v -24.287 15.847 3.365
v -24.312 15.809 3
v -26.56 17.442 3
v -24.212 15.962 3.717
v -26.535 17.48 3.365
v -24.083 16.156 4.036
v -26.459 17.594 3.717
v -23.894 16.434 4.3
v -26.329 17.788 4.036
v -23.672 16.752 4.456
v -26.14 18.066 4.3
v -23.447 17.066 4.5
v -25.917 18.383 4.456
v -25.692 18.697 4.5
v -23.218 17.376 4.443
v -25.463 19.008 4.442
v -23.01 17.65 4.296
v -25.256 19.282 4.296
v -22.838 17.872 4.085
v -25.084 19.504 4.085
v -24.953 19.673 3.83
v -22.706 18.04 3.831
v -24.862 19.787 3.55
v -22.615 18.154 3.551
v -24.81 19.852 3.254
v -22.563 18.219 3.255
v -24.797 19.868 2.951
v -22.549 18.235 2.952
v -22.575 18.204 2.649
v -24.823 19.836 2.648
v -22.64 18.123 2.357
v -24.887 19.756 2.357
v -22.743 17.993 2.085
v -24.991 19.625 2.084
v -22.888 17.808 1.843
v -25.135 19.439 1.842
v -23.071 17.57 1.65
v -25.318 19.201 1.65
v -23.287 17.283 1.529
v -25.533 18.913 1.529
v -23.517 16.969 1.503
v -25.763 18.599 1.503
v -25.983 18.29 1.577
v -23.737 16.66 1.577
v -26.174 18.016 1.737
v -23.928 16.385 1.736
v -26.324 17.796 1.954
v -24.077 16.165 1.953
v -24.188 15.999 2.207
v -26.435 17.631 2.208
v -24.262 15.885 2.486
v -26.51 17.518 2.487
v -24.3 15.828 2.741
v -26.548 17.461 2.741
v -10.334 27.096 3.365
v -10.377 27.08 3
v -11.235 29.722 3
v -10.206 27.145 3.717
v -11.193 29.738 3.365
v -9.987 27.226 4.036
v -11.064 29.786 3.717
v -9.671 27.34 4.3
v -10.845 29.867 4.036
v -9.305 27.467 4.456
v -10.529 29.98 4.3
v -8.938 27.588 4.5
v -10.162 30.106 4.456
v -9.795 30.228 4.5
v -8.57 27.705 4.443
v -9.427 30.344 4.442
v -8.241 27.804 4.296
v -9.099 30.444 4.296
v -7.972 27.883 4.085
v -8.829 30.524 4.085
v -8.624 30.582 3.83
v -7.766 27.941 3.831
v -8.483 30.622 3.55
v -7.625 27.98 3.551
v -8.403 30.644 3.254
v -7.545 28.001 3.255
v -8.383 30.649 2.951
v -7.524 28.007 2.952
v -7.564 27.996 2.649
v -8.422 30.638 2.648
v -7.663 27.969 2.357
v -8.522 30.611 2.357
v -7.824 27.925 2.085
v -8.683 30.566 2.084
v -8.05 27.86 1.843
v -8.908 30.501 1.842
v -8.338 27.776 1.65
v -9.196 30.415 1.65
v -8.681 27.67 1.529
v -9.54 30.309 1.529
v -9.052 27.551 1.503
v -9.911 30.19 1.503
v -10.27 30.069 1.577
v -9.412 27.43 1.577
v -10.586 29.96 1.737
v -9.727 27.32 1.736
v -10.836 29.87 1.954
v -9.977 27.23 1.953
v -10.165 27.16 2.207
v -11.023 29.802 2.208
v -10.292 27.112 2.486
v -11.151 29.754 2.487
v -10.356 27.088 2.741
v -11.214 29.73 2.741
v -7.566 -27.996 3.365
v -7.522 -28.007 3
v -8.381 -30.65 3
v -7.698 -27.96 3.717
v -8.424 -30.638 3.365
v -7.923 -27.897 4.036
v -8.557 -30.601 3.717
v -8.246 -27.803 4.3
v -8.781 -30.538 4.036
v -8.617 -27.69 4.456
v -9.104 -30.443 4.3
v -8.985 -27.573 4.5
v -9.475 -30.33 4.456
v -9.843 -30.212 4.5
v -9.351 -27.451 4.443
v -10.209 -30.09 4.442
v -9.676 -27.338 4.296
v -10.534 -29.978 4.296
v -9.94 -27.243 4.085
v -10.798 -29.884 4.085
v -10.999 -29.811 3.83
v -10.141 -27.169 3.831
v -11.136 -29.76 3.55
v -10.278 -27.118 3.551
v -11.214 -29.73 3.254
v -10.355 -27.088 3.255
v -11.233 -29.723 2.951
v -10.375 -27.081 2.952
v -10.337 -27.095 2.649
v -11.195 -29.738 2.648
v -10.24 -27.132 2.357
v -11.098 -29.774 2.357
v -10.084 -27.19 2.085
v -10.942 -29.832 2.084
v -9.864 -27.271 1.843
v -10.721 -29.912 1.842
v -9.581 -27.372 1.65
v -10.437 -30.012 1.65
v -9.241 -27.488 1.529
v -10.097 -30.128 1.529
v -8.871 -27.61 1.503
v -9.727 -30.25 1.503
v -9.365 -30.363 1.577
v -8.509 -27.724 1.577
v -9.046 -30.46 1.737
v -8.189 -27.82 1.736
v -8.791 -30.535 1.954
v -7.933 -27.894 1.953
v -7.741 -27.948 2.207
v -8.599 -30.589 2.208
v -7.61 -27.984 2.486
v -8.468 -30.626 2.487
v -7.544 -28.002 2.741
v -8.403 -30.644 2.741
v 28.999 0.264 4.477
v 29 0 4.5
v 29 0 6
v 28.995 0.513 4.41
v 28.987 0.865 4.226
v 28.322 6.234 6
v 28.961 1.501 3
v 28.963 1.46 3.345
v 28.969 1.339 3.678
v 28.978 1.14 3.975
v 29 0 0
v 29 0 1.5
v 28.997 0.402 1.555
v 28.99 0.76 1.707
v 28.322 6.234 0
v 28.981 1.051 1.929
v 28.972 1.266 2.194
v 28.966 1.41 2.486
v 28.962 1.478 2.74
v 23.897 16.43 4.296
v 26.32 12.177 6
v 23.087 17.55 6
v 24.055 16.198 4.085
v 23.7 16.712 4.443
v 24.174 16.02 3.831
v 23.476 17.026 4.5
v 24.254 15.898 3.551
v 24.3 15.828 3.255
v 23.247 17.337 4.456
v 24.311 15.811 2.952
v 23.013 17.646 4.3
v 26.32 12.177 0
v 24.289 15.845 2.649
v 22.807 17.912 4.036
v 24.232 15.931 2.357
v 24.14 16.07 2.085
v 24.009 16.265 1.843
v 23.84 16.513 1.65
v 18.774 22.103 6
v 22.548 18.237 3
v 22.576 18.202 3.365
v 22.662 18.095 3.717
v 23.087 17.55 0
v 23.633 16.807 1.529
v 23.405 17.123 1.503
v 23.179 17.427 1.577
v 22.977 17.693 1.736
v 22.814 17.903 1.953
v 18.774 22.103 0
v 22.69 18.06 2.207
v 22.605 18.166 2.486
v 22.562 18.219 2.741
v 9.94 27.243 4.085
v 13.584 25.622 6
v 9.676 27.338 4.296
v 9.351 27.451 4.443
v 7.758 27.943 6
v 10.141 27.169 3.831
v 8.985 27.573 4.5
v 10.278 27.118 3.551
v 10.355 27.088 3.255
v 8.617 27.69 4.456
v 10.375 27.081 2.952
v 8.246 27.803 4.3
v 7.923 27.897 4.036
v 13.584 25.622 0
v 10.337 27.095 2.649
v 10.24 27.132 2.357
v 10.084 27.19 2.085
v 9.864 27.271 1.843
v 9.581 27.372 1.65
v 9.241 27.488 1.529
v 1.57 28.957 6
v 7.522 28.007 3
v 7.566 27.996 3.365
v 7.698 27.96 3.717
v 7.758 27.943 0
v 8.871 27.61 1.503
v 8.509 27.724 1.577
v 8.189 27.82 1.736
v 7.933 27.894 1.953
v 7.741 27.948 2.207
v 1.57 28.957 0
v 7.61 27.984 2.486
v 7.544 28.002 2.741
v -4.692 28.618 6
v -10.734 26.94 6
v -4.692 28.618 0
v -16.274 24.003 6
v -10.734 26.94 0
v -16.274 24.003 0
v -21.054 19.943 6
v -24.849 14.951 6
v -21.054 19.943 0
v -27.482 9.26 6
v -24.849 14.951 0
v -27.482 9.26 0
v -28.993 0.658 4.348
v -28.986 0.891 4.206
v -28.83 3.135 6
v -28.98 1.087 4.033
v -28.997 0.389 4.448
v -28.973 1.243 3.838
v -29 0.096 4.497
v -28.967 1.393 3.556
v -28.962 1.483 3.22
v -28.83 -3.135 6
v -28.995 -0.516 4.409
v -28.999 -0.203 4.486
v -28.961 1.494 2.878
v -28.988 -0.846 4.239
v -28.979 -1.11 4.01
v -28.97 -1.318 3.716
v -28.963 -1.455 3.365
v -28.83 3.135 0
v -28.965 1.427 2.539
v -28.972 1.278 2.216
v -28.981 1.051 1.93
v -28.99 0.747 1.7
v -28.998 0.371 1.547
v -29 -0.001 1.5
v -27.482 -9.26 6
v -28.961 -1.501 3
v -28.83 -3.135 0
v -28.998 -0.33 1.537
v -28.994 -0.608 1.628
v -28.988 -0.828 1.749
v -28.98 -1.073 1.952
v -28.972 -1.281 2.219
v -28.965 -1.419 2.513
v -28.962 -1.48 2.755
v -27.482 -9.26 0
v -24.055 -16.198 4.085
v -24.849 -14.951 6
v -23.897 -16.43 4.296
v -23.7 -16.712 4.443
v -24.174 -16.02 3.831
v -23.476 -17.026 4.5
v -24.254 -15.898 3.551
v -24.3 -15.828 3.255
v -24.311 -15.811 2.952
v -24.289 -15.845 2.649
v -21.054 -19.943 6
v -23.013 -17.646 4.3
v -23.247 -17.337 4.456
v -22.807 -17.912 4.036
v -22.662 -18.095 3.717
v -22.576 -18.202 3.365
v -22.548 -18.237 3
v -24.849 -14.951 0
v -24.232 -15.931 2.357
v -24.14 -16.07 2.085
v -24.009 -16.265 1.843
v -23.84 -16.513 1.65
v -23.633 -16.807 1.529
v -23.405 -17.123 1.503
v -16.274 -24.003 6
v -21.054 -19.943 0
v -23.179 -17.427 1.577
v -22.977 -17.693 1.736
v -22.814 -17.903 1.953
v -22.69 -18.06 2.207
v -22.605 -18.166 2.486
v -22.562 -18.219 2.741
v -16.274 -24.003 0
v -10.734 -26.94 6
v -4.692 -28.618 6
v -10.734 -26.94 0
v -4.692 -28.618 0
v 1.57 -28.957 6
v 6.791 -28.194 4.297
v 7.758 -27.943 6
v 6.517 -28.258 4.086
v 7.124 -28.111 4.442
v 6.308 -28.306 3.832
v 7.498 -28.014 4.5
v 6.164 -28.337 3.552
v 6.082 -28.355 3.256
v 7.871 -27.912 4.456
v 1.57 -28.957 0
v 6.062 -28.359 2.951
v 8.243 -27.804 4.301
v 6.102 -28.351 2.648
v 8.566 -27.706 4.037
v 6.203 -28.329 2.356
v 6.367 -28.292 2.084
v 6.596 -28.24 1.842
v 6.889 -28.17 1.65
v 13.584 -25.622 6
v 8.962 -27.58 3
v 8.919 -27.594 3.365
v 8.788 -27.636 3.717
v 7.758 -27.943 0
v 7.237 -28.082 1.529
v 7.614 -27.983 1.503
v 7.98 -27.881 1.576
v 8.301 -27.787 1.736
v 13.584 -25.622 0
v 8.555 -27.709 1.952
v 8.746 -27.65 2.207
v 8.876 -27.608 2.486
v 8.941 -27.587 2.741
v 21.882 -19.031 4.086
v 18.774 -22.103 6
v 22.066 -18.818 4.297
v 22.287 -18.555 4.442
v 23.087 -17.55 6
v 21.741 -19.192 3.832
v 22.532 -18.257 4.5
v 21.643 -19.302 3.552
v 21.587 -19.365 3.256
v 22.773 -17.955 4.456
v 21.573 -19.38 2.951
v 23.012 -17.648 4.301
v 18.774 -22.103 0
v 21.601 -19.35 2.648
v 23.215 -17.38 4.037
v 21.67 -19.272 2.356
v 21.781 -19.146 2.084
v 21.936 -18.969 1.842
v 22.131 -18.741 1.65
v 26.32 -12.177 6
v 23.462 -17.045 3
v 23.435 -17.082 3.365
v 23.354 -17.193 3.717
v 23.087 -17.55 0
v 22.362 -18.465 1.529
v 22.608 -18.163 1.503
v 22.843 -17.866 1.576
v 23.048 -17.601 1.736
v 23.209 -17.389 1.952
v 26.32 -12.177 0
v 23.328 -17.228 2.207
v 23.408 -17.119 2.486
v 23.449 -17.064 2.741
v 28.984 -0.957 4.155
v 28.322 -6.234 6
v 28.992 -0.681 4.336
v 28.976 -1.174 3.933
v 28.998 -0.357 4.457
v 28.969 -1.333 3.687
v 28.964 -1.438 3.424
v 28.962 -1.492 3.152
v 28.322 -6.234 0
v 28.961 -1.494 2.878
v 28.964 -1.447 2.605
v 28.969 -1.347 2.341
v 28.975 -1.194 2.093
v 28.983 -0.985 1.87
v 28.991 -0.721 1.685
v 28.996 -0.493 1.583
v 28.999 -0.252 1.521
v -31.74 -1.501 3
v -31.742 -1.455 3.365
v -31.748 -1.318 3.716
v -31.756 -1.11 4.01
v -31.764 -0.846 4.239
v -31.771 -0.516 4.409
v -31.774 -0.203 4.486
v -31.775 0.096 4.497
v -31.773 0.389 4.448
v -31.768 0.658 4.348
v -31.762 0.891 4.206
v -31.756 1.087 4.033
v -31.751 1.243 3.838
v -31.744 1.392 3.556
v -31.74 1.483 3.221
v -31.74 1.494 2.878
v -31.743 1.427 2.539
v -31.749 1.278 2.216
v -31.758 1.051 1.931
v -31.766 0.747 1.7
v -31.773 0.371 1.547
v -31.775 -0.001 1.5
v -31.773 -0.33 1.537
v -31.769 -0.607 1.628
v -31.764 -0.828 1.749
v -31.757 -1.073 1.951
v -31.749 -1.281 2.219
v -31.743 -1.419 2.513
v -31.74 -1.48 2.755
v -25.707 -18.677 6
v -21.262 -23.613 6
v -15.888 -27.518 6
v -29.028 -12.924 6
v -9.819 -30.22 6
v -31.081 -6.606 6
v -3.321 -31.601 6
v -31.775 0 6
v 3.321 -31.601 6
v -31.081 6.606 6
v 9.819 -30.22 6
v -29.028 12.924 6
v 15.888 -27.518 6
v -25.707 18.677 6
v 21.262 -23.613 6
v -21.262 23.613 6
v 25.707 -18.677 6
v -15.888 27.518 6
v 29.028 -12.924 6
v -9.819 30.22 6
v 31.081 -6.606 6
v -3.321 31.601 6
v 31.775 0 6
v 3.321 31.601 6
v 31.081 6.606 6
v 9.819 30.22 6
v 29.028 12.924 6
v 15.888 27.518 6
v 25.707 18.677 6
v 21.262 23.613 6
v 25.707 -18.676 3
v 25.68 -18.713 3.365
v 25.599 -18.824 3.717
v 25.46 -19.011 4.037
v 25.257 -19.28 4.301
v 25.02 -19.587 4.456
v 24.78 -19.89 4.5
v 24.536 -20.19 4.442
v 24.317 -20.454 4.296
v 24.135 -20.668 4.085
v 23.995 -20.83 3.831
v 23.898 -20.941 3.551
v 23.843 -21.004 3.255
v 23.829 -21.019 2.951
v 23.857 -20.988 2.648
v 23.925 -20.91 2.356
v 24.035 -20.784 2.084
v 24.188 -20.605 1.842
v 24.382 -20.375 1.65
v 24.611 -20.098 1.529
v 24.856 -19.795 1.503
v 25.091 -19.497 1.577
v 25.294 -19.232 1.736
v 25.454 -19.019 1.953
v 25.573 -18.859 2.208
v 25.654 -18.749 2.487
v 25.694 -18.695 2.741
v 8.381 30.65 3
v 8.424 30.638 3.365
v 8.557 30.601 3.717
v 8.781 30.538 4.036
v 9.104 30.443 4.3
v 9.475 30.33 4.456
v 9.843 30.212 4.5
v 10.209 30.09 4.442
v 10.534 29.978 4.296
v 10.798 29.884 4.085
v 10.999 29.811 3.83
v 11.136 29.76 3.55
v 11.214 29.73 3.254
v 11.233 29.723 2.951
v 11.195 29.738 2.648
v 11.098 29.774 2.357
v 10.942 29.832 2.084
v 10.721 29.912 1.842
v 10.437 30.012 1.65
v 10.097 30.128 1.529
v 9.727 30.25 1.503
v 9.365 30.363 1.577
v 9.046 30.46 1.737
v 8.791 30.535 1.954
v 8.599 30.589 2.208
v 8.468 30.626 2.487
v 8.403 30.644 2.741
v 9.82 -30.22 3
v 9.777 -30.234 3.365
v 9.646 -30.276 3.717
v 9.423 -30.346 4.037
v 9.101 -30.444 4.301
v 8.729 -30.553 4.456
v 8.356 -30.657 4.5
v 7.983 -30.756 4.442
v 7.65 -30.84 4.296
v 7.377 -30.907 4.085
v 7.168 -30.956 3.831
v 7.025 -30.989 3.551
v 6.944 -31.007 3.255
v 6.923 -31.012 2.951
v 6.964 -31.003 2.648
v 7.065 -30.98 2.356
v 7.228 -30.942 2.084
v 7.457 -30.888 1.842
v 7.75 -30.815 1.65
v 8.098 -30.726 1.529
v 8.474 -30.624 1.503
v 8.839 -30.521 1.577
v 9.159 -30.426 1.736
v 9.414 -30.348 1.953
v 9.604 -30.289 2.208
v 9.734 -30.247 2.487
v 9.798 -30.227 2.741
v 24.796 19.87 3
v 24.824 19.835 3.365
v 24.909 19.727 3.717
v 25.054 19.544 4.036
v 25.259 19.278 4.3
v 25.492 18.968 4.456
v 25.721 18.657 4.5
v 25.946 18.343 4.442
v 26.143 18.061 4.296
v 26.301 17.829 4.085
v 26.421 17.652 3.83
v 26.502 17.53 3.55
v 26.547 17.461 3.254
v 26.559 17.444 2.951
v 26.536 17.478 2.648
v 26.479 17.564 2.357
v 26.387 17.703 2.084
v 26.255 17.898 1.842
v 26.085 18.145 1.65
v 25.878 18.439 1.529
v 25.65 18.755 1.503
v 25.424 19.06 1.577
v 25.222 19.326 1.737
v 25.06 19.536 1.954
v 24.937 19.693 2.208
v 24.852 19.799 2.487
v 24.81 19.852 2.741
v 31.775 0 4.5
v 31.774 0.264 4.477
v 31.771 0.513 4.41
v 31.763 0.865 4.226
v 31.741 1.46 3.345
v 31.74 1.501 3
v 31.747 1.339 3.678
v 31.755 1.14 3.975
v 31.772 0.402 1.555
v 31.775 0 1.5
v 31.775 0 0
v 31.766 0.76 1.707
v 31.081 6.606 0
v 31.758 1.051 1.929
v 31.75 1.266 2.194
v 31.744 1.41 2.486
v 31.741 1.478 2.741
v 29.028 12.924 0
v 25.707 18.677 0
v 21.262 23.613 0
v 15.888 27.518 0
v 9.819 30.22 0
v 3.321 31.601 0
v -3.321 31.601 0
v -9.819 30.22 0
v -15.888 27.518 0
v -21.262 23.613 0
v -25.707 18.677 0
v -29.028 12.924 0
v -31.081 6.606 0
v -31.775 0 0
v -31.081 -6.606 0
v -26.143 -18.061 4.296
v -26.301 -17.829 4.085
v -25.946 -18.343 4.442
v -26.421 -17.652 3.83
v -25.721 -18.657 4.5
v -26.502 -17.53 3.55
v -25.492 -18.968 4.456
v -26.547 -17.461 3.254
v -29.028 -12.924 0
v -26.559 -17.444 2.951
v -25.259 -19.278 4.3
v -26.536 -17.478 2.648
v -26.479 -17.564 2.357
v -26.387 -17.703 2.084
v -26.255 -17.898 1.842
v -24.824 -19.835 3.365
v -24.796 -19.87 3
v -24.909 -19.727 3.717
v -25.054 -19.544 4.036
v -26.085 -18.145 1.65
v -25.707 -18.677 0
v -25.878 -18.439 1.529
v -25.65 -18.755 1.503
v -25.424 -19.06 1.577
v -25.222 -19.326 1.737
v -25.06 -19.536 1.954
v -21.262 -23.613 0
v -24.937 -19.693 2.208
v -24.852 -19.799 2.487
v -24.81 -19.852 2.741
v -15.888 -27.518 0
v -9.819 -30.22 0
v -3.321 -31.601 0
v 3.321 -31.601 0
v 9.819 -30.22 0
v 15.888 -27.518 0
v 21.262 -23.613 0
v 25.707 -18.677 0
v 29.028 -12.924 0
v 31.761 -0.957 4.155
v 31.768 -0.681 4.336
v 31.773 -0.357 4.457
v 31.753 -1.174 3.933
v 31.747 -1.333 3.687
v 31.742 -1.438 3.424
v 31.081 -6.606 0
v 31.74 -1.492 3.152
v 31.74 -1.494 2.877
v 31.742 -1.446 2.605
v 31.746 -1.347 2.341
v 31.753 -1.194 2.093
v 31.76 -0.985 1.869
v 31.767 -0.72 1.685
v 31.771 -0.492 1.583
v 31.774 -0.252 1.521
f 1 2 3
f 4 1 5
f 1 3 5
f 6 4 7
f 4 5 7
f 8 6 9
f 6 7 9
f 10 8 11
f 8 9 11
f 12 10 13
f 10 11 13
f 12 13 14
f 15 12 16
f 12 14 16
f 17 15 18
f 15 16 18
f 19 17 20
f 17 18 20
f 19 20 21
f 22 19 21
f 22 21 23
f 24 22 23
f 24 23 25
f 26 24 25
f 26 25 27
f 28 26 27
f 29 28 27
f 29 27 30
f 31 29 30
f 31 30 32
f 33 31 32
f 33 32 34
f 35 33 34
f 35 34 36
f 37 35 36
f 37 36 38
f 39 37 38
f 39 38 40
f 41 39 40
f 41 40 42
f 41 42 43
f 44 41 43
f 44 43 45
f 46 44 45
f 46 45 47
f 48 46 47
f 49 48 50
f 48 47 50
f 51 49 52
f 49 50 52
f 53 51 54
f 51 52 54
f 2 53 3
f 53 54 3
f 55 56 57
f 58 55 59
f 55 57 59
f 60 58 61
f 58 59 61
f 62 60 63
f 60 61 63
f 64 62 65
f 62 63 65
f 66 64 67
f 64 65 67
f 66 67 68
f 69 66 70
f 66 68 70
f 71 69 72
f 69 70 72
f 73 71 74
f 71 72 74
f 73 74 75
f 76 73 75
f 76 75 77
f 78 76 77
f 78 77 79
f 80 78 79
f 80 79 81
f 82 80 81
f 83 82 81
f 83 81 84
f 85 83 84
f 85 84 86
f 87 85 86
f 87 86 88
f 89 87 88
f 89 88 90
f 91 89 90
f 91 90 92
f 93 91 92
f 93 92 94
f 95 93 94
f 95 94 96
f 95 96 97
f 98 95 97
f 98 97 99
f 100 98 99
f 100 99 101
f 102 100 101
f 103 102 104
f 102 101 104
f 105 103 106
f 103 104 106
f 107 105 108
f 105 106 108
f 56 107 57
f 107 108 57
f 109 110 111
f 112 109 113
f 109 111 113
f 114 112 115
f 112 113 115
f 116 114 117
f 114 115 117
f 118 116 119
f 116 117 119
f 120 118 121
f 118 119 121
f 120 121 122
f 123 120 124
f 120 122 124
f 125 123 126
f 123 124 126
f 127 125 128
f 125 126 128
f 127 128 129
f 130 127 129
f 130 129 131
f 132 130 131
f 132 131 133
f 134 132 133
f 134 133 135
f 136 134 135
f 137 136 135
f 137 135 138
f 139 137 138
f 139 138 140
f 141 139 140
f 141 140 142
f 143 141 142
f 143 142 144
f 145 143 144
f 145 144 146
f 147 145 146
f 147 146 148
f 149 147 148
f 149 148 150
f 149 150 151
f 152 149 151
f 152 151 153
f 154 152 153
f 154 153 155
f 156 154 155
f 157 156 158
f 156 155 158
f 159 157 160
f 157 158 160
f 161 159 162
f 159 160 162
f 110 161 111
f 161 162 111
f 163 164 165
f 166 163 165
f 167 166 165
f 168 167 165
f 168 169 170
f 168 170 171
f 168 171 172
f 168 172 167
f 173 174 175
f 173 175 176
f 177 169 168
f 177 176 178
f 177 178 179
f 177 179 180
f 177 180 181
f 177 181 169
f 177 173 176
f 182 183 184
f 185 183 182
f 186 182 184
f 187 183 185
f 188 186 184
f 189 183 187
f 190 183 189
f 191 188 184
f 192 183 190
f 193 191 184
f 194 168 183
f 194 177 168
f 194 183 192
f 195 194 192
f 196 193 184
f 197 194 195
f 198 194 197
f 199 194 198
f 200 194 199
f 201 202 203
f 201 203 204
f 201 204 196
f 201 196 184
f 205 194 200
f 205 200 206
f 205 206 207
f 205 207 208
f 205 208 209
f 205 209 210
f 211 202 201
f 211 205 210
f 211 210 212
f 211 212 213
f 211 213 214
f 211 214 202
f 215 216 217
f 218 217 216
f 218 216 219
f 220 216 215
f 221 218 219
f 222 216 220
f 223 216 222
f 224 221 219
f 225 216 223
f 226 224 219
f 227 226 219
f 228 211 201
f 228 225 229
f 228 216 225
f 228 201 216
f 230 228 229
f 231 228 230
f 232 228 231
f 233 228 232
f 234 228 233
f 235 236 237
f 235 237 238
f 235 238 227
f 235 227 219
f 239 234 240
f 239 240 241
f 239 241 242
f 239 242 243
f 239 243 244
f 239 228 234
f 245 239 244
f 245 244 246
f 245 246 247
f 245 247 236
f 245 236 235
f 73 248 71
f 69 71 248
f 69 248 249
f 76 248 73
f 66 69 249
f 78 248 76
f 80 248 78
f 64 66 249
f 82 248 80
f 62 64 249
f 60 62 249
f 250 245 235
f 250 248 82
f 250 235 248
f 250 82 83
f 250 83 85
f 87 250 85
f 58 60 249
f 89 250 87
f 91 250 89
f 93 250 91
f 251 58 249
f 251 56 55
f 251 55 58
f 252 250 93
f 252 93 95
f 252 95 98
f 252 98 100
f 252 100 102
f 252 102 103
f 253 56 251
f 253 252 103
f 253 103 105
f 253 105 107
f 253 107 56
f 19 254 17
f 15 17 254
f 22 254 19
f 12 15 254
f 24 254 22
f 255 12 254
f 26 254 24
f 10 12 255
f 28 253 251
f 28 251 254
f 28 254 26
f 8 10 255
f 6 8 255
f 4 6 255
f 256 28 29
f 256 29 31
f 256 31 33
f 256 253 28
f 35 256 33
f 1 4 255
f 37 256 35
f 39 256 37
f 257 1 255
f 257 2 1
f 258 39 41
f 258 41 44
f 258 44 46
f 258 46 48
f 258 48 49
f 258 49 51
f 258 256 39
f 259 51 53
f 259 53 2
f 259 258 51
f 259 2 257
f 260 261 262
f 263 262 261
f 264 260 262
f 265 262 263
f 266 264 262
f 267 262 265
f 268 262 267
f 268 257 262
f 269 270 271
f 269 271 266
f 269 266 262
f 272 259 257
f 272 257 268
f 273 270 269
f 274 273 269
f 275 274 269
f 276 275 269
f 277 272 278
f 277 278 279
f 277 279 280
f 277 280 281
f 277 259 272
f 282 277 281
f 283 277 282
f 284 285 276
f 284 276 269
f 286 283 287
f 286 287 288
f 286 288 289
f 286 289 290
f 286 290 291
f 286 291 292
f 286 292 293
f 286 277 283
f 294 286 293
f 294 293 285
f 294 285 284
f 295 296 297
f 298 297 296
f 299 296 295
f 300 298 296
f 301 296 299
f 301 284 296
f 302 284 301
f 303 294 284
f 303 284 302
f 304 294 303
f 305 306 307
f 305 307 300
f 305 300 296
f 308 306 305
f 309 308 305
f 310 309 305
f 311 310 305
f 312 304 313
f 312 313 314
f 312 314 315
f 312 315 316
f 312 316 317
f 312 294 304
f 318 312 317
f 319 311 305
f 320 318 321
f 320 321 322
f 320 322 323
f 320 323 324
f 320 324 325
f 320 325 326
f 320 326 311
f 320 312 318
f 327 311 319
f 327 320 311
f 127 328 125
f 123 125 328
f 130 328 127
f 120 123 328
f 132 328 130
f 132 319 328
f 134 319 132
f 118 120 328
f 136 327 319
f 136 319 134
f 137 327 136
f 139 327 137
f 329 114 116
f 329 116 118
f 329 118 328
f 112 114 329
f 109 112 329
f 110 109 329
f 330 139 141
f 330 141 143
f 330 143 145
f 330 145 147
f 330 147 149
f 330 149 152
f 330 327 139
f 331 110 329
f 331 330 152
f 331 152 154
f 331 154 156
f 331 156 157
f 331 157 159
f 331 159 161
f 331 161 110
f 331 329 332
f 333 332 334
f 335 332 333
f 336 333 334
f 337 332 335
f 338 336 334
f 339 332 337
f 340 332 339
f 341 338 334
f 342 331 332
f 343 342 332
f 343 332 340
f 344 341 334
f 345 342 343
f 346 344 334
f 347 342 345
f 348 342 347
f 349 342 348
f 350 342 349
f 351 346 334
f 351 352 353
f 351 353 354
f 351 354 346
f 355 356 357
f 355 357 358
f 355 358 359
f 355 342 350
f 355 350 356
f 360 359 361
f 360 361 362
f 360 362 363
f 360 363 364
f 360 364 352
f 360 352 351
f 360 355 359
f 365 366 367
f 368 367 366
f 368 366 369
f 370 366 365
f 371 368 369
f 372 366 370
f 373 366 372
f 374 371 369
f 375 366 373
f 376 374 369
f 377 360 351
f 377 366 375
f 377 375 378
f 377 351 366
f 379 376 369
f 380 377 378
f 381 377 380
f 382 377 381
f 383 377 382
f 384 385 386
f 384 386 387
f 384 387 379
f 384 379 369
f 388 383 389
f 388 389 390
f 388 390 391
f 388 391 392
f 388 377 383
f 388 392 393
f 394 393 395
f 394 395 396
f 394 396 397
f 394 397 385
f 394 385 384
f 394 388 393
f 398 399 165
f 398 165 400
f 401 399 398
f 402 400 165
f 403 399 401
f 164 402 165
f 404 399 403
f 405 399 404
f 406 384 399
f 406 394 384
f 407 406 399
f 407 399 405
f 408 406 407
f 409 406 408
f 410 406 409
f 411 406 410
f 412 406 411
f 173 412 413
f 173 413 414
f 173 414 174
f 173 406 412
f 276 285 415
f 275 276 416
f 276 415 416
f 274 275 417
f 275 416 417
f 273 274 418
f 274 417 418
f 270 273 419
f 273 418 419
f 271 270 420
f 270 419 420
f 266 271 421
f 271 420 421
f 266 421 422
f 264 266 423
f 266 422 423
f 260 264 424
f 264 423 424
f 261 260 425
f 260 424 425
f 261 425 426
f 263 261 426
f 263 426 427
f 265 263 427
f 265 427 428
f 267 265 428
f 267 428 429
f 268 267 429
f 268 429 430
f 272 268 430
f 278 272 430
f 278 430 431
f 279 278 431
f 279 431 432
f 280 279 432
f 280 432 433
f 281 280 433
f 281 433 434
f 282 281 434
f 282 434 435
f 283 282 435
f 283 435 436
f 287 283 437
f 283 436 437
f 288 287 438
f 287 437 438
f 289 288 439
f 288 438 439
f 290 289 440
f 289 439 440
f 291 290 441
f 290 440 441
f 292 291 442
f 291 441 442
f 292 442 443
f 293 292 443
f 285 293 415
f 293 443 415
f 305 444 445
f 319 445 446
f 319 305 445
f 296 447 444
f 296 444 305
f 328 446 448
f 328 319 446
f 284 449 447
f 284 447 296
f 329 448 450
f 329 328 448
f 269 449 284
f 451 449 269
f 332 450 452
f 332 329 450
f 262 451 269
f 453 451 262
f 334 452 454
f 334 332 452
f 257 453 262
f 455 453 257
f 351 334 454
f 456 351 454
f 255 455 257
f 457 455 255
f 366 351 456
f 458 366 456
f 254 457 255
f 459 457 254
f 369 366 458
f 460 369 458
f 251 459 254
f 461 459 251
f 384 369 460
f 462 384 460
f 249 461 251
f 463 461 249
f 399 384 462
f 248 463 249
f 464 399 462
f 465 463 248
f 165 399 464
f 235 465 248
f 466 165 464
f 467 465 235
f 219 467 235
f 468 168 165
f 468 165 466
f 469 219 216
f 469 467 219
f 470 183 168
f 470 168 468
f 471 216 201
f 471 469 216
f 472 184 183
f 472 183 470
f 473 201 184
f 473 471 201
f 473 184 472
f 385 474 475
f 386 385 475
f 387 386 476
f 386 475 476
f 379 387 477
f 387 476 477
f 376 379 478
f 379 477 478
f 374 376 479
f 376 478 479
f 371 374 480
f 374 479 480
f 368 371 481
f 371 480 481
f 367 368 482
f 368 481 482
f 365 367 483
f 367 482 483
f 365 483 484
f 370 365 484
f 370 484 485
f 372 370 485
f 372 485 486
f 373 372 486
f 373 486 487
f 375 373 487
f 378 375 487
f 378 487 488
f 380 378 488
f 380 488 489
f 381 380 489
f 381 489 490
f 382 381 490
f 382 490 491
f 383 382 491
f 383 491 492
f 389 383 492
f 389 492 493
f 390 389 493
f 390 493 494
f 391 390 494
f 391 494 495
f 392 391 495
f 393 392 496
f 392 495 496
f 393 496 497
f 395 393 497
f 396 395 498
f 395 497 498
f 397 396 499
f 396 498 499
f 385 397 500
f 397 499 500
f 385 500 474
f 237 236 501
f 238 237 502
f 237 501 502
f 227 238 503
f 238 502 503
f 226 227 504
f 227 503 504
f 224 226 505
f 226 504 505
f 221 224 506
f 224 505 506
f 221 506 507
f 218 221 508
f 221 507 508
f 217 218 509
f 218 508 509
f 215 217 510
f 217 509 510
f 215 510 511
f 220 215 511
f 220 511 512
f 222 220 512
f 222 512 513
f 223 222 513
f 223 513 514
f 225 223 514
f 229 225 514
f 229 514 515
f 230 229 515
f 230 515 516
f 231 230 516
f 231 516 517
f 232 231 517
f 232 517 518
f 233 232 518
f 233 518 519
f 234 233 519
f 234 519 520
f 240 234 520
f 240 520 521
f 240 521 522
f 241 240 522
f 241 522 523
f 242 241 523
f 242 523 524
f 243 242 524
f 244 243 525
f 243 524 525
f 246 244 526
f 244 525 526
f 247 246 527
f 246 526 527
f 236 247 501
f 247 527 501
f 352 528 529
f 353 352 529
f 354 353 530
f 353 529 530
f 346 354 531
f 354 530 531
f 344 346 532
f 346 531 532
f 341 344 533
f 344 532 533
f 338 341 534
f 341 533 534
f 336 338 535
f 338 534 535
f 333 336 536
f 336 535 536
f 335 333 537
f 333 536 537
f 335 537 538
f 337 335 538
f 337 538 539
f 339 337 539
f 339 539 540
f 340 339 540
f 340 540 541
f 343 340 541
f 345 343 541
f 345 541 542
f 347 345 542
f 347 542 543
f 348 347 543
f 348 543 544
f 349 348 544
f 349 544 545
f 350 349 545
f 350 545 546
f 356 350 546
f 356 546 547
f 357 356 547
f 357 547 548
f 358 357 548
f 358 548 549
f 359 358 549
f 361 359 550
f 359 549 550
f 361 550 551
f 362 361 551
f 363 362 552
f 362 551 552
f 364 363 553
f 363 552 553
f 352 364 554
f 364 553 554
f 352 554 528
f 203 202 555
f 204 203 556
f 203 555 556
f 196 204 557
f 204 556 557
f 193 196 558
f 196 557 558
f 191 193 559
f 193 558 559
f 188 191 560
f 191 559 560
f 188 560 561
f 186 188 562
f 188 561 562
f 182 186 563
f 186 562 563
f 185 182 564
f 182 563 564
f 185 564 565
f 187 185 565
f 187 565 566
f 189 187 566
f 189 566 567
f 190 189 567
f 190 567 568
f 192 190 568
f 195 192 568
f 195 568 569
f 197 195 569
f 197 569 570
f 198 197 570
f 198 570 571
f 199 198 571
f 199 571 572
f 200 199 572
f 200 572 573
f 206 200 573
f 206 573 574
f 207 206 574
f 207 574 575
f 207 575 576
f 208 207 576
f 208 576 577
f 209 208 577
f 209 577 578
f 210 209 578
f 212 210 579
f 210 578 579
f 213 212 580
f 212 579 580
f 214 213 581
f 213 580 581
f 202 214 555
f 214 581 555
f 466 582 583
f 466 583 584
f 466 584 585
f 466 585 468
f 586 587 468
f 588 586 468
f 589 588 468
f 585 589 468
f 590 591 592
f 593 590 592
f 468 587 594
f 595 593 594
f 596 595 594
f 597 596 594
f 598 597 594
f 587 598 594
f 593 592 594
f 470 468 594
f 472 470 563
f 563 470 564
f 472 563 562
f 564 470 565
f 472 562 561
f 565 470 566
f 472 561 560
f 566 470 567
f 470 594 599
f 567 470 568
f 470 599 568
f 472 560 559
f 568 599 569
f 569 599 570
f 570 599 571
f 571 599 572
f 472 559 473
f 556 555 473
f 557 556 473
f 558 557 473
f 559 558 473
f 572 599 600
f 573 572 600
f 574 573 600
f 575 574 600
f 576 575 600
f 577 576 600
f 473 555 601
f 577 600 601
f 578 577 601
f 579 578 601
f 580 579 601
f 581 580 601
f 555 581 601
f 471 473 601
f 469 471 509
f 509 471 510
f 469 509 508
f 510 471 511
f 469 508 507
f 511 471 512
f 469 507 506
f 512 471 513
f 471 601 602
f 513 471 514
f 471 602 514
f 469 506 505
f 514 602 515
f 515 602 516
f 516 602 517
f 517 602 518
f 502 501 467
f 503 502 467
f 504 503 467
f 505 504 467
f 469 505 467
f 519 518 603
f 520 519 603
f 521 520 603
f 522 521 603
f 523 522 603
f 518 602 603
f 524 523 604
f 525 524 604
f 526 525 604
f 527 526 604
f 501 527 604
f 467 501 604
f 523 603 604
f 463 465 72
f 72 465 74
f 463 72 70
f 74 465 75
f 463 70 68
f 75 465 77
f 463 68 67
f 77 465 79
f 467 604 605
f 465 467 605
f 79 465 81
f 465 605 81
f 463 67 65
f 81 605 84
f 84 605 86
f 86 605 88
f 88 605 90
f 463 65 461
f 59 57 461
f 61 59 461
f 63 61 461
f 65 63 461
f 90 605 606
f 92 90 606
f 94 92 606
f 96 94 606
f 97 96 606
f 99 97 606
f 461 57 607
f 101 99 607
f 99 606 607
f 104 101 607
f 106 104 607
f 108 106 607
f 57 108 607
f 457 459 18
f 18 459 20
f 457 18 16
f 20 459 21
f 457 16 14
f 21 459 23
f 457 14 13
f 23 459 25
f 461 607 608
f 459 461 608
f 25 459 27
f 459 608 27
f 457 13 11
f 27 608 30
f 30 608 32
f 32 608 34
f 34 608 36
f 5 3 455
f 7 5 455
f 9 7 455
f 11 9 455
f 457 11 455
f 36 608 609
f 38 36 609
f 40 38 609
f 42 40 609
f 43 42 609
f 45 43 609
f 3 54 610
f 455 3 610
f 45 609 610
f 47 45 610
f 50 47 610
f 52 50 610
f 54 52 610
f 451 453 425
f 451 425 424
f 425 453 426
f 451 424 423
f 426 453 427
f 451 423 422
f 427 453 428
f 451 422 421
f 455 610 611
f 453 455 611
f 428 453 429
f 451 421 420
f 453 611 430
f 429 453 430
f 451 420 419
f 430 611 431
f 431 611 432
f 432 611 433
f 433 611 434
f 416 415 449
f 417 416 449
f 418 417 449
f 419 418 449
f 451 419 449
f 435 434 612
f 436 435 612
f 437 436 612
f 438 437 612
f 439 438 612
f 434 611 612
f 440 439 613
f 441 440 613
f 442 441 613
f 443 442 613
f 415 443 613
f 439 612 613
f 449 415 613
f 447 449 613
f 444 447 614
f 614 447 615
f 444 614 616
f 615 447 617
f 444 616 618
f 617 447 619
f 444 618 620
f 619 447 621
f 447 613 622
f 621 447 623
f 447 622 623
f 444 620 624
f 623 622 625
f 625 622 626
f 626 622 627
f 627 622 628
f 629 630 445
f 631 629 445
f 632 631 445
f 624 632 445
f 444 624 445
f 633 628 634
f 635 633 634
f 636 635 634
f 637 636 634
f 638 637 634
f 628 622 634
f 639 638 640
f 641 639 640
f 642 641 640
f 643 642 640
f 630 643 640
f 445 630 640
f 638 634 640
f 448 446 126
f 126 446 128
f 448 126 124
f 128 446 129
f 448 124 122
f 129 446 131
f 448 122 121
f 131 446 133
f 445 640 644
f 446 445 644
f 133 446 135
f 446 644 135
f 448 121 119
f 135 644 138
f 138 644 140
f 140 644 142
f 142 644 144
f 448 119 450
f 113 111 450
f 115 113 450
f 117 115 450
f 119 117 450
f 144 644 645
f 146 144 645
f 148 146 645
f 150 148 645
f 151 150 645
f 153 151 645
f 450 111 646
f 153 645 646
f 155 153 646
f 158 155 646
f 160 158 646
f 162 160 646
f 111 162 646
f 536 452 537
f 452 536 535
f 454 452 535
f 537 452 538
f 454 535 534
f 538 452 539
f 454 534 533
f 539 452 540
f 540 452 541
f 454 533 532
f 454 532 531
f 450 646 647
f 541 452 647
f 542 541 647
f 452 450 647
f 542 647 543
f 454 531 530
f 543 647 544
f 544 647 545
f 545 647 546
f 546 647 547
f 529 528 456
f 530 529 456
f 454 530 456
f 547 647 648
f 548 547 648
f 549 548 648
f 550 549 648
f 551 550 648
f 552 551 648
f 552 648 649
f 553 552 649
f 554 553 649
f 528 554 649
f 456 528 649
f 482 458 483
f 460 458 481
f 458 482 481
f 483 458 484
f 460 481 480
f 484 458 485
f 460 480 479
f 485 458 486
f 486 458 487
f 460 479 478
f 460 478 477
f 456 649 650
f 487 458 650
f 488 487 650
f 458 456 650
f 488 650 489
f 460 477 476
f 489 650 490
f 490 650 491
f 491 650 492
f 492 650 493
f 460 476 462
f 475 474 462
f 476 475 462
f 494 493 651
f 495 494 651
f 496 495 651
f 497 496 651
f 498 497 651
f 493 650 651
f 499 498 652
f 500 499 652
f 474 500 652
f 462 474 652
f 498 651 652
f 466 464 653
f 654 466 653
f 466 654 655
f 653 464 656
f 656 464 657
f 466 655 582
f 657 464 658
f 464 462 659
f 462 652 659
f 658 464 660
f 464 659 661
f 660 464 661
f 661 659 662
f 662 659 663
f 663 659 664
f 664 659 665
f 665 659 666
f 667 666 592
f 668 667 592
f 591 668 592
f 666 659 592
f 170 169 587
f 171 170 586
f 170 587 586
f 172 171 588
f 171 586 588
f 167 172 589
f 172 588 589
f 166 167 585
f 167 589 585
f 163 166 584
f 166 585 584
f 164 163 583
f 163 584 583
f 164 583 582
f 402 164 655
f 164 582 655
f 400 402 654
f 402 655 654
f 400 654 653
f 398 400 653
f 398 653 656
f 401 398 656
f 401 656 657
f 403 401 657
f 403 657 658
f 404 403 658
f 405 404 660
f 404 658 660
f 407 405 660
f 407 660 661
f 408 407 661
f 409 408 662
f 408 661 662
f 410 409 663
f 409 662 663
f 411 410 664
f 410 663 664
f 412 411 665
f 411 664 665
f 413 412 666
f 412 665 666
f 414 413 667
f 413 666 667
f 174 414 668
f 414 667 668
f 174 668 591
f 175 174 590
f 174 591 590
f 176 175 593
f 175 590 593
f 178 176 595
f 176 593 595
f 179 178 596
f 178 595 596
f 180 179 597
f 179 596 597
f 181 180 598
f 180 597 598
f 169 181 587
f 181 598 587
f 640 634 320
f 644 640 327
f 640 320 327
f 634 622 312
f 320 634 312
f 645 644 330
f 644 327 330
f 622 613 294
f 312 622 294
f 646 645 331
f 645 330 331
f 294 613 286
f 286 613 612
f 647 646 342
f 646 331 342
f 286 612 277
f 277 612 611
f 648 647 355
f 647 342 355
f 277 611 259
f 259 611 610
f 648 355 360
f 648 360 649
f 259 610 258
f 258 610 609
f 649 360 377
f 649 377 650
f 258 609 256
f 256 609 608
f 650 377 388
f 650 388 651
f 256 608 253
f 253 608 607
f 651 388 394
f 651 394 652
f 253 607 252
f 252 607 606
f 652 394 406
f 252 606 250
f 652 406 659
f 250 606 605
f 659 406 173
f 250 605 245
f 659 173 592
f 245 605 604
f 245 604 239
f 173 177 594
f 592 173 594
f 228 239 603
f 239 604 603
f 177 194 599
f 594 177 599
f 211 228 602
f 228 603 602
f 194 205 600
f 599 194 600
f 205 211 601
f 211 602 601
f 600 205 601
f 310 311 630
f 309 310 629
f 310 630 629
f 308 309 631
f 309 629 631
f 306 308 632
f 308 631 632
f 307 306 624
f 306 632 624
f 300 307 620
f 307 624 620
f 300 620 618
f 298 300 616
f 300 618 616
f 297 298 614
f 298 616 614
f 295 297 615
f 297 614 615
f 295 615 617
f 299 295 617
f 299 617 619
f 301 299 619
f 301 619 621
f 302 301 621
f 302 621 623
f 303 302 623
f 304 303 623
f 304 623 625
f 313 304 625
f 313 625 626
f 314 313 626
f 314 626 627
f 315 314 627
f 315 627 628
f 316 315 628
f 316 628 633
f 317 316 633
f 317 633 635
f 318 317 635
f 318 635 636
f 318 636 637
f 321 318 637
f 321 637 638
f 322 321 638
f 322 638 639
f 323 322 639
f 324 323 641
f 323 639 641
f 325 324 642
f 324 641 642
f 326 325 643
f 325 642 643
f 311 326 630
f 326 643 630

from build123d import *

# Parameters (mm, degrees)
F0_R           = 29
F1_DEPTH       = 6
F9_R           = 1.5
F12_DEPTH      = 5
F12_DEPTH_BACK = 10
F10_R          = 1.5
F13_DEPTH      = 5
F13_DEPTH_BACK = 10
F8_R           = 1.5
F14_DEPTH      = 5
F14_DEPTH_BACK = 10
F11_R          = 1.5
F15_DEPTH      = 5
F15_DEPTH_BACK = 10
F4_R           = 1.5
F16_DEPTH      = 5
F16_DEPTH_BACK = 10
F7_R           = 1.5
F17_DEPTH      = 5
F17_DEPTH_BACK = 10
F6_R           = 1.5
F18_DEPTH      = 5
F18_DEPTH_BACK = 10
F5_R           = 1.5
F19_DEPTH      = 5
F19_DEPTH_BACK = 10
F3_R           = 1.5
F20_DEPTH      = 5
F20_DEPTH_BACK = 10
F21_R          = 36.5
F21_R_2        = 31.775
F22_DEPTH      = 6
F2_R           = 1.5
F23_DEPTH      = 10


with BuildPart() as f1:
    # F0 (on Top) → F1 (new body)
    with BuildSketch(Plane.XY):
        Polygon((33.286979, -10.815593), (33.286977, 10.815597), (20.572482, 28.315596), (-2e-06, 35), (-20.572485, 28.315594), (-33.286979, 10.815593), (-33.286977, -10.815597), (-20.572482, -28.315596), (2e-06, -35), (20.572485, -28.315594), align=None)
        Circle(F0_R, mode=Mode.SUBTRACT)
    extrude(amount=F1_DEPTH)

    # F9 (on face) → F12 (cut, two sides)
    with BuildSketch(Plane(origin=(-33.286978, -2e-06, 0), x_dir=(0, -1, 0), z_dir=(-1, 0, 0))) as f12_sk:
        with Locations((0.000595, 3)):
            Circle(F9_R)
    extrude(amount=-F12_DEPTH, mode=Mode.SUBTRACT)
    extrude(f12_sk.sketch, amount=-F12_DEPTH_BACK, mode=Mode.SUBTRACT)

    # F10 (on face) → F13 (cut, two sides)
    with BuildSketch(Plane(origin=(10.286244, -31.657797, 0), x_dir=(0.951056, 0.309017, 0), z_dir=(0.309017, -0.951056, 0))) as f13_sk:
        with Locations((-1.499405, 3)):
            Circle(F10_R)
    extrude(amount=-F13_DEPTH, mode=Mode.SUBTRACT)
    extrude(f13_sk.sketch, amount=-F13_DEPTH_BACK, mode=Mode.SUBTRACT)

    # F8 (on face) → F14 (cut, two sides)
    with BuildSketch(Plane(origin=(33.286978, 2e-06, 0), x_dir=(0, 1, 0), z_dir=(1, 0, 0))) as f14_sk:
        with Locations((0.000595, 3)):
            Circle(F8_R)
    extrude(amount=F14_DEPTH, mode=Mode.SUBTRACT)
    extrude(f14_sk.sketch, amount=-F14_DEPTH_BACK, mode=Mode.SUBTRACT)

    # F11 (on face) → F15 (cut, two sides)
    with BuildSketch(Plane(origin=(26.929732, -19.565593, 0), x_dir=(0.587785, 0.809017, 0), z_dir=(0.809017, -0.587785, 0))) as f15_sk:
        with Locations((-1.499405, 3)):
            Circle(F11_R)
    extrude(amount=F15_DEPTH, mode=Mode.SUBTRACT)
    extrude(f15_sk.sketch, amount=-F15_DEPTH_BACK, mode=Mode.SUBTRACT)

    # F4 (on face) → F16 (cut, two sides)
    with BuildSketch(Plane(origin=(-26.92973, -19.565596, 0), x_dir=(0.587785, -0.809017, 0), z_dir=(-0.809017, -0.587785, 0))) as f16_sk:
        with Locations((0.000595, 3)):
            Circle(F4_R)
    extrude(amount=F16_DEPTH, mode=Mode.SUBTRACT)
    extrude(f16_sk.sketch, amount=-F16_DEPTH_BACK, mode=Mode.SUBTRACT)

    # F7 (on face) → F17 (cut, two sides)
    with BuildSketch(Plane(origin=(-26.929732, 19.565593, 0), x_dir=(-0.587785, -0.809017, 0), z_dir=(-0.809017, 0.587785, 0))) as f17_sk:
        with Locations((0.000595, 3)):
            Circle(F7_R)
    extrude(amount=F17_DEPTH, mode=Mode.SUBTRACT)
    extrude(f17_sk.sketch, amount=-F17_DEPTH_BACK, mode=Mode.SUBTRACT)

    # F6 (on face) → F18 (cut, two sides)
    with BuildSketch(Plane(origin=(26.92973, 19.565596, 0), x_dir=(-0.587785, 0.809017, 0), z_dir=(0.809017, 0.587785, 0))) as f18_sk:
        with Locations((0.000595, 3)):
            Circle(F6_R)
    extrude(amount=-F18_DEPTH, mode=Mode.SUBTRACT)
    extrude(f18_sk.sketch, amount=-F18_DEPTH_BACK, mode=Mode.SUBTRACT)

    # F5 (on face) → F19 (cut, two sides)
    with BuildSketch(Plane(origin=(-10.28624, -31.657798, 0), x_dir=(0.951057, -0.309017, 0), z_dir=(-0.309017, -0.951057, 0))) as f19_sk:
        with Locations((0.000595, 3)):
            Circle(F5_R)
    extrude(amount=-F19_DEPTH, mode=Mode.SUBTRACT)
    extrude(f19_sk.sketch, amount=-F19_DEPTH_BACK, mode=Mode.SUBTRACT)

    # F3 (on face) → F20 (cut, two sides)
    with BuildSketch(Plane(origin=(10.28624, 31.657798, 0), x_dir=(-0.951057, 0.309017, 0), z_dir=(0.309017, 0.951057, 0))) as f20_sk:
        with Locations((0.000595, 3)):
            Circle(F3_R)
    extrude(amount=-F20_DEPTH, mode=Mode.SUBTRACT)
    extrude(f20_sk.sketch, amount=-F20_DEPTH_BACK, mode=Mode.SUBTRACT)

    # F21 (on Top) → F22 (cut)
    with BuildSketch(Plane.XY):
        Circle(F21_R)
        Circle(F21_R_2, mode=Mode.SUBTRACT)
    extrude(amount=F22_DEPTH, mode=Mode.SUBTRACT)

    # F2 (on face) → F23 (cut)
    with BuildSketch(Plane(origin=(-10.286244, 31.657797, 0), x_dir=(-0.951056, -0.309017, 0), z_dir=(-0.309017, 0.951056, 0))):
        with Locations((0.000595, 3)):
            Circle(F2_R)
    extrude(amount=-F23_DEPTH, mode=Mode.SUBTRACT)


solid = f1.part
